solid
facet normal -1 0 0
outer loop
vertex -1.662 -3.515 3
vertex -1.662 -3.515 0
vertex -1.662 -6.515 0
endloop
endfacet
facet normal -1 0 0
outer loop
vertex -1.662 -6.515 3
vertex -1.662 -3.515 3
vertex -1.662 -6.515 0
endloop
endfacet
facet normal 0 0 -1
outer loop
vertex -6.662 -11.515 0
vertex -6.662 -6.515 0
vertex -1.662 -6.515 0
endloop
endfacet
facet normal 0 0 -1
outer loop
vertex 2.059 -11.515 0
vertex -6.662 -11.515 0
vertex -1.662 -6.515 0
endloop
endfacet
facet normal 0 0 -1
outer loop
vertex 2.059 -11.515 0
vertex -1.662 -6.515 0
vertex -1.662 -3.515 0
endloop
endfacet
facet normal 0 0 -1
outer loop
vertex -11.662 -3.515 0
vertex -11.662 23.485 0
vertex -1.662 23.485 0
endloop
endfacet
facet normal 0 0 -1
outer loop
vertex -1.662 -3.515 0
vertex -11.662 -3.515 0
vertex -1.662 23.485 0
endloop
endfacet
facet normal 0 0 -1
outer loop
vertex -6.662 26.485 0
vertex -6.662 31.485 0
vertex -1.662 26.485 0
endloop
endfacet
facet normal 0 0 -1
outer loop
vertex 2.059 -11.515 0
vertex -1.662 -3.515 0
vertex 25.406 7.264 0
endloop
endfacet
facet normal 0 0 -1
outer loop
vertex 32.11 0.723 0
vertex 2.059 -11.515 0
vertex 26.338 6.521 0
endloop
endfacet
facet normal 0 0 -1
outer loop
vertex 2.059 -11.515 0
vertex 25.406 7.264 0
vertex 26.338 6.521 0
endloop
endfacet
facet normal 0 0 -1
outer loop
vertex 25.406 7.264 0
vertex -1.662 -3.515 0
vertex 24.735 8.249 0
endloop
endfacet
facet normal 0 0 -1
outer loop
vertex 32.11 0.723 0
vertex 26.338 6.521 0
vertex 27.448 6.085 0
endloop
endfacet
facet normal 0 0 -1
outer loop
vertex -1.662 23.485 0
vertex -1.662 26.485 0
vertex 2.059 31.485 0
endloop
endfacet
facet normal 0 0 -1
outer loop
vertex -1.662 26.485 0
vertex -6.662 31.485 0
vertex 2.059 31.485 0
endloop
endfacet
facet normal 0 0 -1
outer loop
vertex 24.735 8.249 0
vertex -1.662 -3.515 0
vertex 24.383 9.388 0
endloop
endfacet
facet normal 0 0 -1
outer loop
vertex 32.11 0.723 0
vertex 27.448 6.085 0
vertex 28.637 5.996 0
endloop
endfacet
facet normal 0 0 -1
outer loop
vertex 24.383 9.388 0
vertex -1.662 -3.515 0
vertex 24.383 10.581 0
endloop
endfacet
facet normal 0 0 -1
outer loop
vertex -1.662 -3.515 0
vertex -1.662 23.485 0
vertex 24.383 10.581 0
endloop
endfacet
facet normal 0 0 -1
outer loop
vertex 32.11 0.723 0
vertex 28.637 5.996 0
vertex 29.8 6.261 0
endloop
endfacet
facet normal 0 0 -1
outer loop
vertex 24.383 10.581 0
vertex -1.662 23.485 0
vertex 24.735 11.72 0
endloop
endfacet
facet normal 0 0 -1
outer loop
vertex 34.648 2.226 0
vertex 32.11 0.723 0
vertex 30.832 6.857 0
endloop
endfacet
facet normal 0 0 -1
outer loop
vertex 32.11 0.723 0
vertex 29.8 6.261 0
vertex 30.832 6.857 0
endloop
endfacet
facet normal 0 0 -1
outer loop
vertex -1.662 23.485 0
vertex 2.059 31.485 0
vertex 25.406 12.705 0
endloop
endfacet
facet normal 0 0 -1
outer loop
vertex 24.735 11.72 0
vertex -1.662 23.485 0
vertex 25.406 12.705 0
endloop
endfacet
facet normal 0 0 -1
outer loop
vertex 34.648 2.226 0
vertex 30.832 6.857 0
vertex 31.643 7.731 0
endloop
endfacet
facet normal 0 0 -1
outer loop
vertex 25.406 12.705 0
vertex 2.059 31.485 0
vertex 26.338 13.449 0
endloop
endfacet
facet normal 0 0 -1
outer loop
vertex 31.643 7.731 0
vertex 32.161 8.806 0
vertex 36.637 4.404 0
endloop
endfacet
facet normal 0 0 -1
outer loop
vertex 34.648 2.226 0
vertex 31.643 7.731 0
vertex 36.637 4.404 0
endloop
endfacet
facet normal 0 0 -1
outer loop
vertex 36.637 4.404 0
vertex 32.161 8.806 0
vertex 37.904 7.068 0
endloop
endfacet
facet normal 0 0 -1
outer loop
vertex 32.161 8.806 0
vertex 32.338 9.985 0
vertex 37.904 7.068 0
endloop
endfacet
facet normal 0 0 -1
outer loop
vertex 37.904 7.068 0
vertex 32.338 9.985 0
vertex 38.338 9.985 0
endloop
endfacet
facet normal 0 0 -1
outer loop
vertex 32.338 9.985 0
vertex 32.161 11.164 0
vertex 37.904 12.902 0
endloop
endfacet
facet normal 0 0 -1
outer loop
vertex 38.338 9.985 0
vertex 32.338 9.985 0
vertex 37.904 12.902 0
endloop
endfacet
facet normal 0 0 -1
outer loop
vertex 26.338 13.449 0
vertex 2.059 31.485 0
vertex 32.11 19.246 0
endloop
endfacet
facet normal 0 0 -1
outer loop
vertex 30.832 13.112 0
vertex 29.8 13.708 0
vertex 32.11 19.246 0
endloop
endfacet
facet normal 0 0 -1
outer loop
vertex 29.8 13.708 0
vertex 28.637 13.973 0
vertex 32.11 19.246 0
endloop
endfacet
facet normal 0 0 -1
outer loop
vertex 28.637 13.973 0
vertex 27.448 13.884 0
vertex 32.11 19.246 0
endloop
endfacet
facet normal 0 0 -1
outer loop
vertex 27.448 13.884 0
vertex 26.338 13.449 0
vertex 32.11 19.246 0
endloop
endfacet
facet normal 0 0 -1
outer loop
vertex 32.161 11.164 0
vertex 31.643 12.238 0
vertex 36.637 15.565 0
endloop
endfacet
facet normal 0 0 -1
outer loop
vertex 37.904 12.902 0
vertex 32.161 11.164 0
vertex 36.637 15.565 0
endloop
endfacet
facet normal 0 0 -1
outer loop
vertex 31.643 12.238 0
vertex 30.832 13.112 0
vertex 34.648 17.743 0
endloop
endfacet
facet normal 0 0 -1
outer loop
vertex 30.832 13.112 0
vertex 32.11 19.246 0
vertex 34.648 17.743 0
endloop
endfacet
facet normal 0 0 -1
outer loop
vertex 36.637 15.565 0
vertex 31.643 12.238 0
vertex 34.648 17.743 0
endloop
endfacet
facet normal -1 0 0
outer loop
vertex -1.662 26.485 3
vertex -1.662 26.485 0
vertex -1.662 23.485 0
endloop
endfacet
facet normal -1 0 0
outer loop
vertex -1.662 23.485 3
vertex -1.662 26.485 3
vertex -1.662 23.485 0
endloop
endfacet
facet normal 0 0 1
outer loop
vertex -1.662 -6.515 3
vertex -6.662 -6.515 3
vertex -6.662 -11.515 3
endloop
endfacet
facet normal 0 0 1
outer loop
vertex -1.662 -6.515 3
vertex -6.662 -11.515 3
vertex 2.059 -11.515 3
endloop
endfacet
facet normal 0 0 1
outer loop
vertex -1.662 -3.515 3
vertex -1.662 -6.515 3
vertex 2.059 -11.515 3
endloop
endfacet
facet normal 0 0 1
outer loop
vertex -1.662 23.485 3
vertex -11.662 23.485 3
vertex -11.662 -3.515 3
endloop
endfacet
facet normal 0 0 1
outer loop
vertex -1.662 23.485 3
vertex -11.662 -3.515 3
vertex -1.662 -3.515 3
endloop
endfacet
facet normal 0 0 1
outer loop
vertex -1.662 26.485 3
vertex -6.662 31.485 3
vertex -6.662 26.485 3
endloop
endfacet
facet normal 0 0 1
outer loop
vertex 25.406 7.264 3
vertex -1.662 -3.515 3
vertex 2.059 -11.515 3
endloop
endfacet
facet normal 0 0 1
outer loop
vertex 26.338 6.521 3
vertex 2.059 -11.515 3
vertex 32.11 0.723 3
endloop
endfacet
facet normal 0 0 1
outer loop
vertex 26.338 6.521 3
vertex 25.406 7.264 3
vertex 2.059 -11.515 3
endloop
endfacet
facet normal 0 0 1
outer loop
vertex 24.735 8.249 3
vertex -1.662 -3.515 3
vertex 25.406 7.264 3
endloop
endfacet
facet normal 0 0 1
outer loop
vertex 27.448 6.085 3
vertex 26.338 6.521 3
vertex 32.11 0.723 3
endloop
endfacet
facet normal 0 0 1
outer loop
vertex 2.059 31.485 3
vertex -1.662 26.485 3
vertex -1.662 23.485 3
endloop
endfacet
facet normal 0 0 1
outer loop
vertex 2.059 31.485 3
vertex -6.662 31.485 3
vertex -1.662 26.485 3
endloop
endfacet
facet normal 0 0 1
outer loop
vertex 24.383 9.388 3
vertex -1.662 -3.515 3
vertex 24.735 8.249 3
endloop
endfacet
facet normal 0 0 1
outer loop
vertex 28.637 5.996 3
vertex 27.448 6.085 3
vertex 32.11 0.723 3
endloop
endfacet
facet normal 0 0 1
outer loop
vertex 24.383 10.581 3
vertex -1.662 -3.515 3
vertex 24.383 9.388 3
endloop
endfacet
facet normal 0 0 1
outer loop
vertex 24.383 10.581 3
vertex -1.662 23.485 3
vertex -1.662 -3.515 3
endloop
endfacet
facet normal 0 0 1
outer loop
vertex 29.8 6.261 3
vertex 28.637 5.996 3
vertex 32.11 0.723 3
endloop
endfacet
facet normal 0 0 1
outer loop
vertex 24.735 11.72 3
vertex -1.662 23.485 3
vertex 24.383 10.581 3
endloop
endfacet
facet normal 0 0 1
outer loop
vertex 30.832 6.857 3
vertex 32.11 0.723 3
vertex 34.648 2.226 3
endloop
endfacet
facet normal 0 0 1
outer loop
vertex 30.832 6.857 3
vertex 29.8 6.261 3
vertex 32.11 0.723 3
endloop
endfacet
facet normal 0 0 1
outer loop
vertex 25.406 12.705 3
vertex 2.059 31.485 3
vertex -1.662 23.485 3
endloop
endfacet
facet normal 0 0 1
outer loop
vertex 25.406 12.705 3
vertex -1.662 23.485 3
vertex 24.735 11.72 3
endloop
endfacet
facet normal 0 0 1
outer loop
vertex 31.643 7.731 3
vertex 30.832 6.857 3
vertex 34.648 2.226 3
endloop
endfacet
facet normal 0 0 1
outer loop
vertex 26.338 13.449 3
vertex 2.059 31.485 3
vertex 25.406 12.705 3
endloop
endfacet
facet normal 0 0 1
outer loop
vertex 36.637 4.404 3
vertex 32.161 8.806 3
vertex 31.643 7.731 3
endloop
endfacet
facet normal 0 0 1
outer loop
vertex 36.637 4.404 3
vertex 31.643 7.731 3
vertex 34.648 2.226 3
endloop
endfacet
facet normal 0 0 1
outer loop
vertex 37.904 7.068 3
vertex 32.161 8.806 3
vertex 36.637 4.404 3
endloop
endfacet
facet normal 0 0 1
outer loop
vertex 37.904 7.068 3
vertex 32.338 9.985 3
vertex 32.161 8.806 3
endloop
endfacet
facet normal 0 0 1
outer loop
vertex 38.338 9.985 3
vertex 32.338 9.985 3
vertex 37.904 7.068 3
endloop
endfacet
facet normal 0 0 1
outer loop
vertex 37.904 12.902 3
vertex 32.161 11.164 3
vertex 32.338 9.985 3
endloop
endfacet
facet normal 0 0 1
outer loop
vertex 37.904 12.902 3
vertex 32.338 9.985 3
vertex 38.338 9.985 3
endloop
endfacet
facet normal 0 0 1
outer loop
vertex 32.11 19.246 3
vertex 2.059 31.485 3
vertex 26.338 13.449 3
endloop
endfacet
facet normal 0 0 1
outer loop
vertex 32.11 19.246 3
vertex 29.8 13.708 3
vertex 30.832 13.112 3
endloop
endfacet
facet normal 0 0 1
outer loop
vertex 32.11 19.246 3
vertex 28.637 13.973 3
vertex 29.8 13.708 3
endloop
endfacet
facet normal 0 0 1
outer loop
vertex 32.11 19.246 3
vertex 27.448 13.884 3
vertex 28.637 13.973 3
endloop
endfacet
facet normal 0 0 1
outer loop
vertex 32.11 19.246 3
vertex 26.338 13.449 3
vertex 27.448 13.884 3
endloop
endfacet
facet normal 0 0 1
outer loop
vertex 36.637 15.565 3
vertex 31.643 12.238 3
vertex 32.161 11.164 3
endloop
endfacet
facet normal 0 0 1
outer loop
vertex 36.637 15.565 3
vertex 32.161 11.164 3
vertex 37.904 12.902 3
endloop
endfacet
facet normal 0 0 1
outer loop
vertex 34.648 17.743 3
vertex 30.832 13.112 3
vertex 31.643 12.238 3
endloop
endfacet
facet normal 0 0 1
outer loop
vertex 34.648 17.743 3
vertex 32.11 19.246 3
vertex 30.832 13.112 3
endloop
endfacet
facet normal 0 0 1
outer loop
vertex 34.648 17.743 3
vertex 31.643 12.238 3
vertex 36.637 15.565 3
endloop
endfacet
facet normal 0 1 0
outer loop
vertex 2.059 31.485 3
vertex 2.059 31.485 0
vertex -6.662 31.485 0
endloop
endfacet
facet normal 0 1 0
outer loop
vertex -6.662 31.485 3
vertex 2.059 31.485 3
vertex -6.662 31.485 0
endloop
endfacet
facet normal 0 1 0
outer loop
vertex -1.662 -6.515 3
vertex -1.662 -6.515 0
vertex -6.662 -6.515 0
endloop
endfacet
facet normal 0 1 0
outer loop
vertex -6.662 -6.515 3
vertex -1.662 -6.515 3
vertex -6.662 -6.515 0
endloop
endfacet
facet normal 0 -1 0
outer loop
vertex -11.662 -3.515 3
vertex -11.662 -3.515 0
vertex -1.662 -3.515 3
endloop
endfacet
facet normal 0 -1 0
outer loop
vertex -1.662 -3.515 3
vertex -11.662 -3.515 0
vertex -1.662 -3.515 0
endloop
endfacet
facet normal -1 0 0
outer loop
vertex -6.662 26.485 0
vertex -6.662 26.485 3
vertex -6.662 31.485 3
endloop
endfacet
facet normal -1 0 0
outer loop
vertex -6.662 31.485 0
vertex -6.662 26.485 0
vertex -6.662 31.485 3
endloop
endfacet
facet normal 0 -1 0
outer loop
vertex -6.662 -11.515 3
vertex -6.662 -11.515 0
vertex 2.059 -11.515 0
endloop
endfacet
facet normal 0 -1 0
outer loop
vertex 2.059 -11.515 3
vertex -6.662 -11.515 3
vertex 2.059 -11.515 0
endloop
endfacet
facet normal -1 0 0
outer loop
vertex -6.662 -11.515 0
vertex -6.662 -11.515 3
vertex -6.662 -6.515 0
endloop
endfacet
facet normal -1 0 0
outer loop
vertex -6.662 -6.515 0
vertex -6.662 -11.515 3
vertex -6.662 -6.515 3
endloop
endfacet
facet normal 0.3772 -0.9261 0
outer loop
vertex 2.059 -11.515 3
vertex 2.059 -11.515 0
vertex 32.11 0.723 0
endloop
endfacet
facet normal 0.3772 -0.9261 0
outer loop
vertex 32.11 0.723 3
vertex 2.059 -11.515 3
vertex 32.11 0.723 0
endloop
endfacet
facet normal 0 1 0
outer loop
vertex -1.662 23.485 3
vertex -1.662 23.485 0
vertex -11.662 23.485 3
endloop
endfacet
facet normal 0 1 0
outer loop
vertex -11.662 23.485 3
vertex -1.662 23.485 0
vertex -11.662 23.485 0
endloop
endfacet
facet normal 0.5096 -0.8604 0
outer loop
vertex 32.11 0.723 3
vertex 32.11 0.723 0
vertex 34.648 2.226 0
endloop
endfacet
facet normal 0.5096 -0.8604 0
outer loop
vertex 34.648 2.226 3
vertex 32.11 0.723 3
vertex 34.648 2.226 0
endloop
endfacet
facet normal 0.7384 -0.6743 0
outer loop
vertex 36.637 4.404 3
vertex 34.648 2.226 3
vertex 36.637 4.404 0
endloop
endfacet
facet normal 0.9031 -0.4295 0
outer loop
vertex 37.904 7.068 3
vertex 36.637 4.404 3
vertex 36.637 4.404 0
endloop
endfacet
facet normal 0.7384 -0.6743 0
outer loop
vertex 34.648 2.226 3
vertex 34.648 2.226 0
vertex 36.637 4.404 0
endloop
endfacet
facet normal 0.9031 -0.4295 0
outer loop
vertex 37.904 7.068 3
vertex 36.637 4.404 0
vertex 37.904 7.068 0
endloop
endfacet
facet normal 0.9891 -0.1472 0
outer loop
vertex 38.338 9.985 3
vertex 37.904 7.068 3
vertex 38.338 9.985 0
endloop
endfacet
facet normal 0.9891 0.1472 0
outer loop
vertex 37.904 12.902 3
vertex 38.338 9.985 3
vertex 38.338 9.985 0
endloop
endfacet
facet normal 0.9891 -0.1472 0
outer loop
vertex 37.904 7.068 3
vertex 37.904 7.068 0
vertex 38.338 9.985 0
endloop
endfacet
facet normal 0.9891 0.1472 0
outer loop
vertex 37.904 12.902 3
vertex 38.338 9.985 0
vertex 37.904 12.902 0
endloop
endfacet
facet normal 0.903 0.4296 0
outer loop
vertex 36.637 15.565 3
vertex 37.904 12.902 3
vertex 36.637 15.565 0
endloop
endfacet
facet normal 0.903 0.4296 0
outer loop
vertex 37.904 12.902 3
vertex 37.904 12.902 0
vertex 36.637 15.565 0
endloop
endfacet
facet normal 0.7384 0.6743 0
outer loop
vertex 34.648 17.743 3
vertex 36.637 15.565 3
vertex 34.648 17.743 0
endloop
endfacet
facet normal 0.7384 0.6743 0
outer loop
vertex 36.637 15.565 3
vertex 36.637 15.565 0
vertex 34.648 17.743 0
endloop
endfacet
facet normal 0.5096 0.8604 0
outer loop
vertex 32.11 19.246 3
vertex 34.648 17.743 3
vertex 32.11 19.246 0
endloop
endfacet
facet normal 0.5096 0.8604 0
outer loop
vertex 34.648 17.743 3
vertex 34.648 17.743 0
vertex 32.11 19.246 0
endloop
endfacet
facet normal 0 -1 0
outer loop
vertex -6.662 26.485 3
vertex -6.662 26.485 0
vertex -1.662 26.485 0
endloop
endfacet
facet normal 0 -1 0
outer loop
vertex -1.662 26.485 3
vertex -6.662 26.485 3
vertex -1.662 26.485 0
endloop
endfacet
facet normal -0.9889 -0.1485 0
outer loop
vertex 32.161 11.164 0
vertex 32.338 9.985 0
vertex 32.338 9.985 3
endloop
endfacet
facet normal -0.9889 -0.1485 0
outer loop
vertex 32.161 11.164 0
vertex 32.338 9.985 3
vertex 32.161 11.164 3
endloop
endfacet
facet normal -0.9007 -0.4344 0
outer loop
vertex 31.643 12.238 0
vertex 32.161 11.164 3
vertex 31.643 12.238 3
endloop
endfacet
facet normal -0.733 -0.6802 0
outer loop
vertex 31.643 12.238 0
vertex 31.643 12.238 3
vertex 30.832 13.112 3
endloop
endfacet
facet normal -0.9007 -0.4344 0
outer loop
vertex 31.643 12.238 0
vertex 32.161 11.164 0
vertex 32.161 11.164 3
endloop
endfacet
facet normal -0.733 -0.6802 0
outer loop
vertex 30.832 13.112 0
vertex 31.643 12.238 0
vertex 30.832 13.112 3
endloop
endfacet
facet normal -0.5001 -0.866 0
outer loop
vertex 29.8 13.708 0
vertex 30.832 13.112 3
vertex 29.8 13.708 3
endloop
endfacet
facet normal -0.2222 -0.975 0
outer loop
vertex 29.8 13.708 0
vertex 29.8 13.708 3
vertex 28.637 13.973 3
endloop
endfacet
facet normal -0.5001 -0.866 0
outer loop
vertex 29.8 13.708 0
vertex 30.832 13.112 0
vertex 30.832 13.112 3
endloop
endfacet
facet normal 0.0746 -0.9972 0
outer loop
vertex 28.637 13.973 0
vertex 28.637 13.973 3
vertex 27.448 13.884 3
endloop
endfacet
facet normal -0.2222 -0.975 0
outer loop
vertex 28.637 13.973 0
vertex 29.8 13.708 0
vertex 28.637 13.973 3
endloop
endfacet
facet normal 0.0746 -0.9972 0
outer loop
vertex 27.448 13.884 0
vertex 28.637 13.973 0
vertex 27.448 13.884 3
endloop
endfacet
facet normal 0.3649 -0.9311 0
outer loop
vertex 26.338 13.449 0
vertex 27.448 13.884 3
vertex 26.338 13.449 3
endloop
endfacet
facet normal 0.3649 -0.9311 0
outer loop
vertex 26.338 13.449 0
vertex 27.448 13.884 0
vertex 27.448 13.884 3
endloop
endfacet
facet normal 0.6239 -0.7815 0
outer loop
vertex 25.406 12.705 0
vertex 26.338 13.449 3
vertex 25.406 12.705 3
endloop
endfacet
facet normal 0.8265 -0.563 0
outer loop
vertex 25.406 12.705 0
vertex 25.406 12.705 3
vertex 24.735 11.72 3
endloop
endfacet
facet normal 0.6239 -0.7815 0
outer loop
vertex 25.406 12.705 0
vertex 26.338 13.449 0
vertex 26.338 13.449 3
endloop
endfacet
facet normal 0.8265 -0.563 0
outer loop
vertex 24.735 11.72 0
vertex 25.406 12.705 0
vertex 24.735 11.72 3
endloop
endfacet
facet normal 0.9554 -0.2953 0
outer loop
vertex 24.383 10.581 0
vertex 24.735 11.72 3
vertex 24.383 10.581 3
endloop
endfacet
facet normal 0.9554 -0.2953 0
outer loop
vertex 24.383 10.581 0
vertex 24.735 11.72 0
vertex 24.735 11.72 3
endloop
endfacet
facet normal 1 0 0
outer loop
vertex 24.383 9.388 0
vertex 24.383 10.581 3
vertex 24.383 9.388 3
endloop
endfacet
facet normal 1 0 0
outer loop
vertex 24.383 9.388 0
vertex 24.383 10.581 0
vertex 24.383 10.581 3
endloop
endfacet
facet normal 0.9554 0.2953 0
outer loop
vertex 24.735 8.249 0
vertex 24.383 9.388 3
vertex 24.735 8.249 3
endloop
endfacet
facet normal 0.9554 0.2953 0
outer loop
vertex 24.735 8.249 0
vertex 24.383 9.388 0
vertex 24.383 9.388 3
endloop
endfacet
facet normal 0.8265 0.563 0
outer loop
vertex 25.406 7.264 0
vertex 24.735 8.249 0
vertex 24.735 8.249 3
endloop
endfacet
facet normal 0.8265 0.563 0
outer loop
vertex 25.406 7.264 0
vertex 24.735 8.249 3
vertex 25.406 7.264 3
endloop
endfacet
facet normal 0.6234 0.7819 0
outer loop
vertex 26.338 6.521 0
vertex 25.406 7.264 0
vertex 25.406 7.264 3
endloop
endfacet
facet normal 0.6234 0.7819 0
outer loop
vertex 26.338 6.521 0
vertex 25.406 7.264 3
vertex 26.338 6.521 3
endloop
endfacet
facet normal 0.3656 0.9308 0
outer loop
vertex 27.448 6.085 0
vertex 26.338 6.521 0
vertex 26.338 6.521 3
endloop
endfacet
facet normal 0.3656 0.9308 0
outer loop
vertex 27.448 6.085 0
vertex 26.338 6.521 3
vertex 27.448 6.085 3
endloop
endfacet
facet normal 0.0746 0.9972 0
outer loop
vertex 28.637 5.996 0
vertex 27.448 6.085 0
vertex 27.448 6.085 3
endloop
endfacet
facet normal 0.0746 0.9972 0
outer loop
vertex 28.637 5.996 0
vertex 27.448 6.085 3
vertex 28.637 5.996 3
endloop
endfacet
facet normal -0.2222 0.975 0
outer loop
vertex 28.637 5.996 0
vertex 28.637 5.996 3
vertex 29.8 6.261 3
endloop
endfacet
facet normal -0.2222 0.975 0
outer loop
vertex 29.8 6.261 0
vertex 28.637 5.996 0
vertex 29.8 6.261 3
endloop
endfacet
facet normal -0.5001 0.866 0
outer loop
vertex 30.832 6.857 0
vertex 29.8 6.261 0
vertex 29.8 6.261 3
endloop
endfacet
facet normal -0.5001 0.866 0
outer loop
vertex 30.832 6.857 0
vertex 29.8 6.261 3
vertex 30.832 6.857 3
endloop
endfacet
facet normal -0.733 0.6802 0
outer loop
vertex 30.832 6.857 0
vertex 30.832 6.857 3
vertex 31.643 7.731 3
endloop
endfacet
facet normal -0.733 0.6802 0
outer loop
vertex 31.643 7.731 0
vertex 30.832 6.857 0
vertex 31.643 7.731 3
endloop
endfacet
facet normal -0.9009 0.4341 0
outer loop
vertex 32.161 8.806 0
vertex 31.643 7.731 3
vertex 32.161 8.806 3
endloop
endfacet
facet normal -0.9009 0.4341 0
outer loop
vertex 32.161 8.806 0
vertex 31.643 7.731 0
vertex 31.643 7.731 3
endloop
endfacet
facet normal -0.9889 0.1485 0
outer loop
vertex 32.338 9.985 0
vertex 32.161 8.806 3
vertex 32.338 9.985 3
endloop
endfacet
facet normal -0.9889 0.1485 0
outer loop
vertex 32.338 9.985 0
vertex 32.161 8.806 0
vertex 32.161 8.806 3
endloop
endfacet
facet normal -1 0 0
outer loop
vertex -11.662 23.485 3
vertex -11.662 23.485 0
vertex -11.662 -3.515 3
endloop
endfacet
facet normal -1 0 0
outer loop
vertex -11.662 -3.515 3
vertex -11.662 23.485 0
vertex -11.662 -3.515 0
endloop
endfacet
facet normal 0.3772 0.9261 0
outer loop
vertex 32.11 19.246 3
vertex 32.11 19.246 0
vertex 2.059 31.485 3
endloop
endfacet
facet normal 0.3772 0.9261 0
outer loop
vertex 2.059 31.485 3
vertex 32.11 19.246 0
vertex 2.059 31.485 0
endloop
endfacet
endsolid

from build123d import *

# Parameters (mm, degrees)
ESQUISSE1_R             = 4
BOSS_EXTRU_1_DEPTH      = 3
ENL_V_MAT_EXTRU_1_REACH = 51.7
ESQUISSE2_W             = 5.860148805
ESQUISSE2_H             = 10.034501378
ESQUISSE2_H_2           = 10.034501379


with BuildPart() as part:
    # Esquisse1 → Boss.-Extru.1 (new body)
    with BuildSketch(Plane.XY):
        with BuildLine():
            Line((-11.661538462, 23.484615385), (-11.661538462, -3.515384615))
            Line((-11.661538462, -3.515384615), (-1.661538462, -3.515384615))
            Line((-1.661538462, -3.515384615), (-1.661538462, -6.515384615))
            Line((-1.661538462, -6.515384615), (-11.661538462, -6.515384615))
            Line((-11.661538462, -6.515384615), (-11.661538462, -11.515384615))
            Line((-11.661538462, -11.515384615), (2.059303641, -11.515384615))
            Line((2.059303641, -11.515384615), (32.110271991, 0.723219922))
            ThreePointArc((32.110271991, 0.723219922), (38.338461538, 9.984615385), (32.110271991, 19.246010847))
            Line((32.110271991, 19.246010847), (2.059303641, 31.484615385))
            Line((2.059303641, 31.484615385), (-11.661538462, 31.484615385))
            Line((-11.661538462, 31.484615385), (-11.661538462, 26.484615385))
            Line((-11.661538462, 26.484615385), (-1.661538462, 26.484615385))
            Line((-1.661538462, 26.484615385), (-1.661538462, 23.484615385))
            Line((-1.661538462, 23.484615385), (-11.661538462, 23.484615385))
        make_face()
        with Locations((28.338461538, 9.984615385)):
            Circle(ESQUISSE1_R, mode=Mode.SUBTRACT)
    extrude(amount=BOSS_EXTRU_1_DEPTH)

    # Esquisse2 → Enlèv. mat.-Extru.1 (cut, up to next)
    with BuildSketch(Plane.XY.offset(3), mode=Mode.PRIVATE) as enl_v_mat_extru_1_sk1:
        with Locations((-9.591612865, 30.1046068)):
            Rectangle(ESQUISSE2_W, ESQUISSE2_H)
    enl_v_mat_extru_1_tool1 = extrude(enl_v_mat_extru_1_sk1.sketch, amount=-ENL_V_MAT_EXTRU_1_REACH, mode=Mode.PRIVATE) & part.part
    # Esquisse2 → Enlèv. mat.-Extru.1 (cut, up to next)
    with BuildSketch(Plane.XY.offset(3), mode=Mode.PRIVATE) as enl_v_mat_extru_1_sk2:
        with Locations((-9.591612865, -10.135376031)):
            Rectangle(ESQUISSE2_W, ESQUISSE2_H_2)
    enl_v_mat_extru_1_tool2 = extrude(enl_v_mat_extru_1_sk2.sketch, amount=-ENL_V_MAT_EXTRU_1_REACH, mode=Mode.PRIVATE) & part.part
    add(enl_v_mat_extru_1_tool1.solids().sort_by_distance((-9.591613, 30.104607, 3))[0], mode=Mode.SUBTRACT)
    add(enl_v_mat_extru_1_tool2.solids().sort_by_distance((-9.591613, -10.135376, 3))[0], mode=Mode.SUBTRACT)


solid = part.part
